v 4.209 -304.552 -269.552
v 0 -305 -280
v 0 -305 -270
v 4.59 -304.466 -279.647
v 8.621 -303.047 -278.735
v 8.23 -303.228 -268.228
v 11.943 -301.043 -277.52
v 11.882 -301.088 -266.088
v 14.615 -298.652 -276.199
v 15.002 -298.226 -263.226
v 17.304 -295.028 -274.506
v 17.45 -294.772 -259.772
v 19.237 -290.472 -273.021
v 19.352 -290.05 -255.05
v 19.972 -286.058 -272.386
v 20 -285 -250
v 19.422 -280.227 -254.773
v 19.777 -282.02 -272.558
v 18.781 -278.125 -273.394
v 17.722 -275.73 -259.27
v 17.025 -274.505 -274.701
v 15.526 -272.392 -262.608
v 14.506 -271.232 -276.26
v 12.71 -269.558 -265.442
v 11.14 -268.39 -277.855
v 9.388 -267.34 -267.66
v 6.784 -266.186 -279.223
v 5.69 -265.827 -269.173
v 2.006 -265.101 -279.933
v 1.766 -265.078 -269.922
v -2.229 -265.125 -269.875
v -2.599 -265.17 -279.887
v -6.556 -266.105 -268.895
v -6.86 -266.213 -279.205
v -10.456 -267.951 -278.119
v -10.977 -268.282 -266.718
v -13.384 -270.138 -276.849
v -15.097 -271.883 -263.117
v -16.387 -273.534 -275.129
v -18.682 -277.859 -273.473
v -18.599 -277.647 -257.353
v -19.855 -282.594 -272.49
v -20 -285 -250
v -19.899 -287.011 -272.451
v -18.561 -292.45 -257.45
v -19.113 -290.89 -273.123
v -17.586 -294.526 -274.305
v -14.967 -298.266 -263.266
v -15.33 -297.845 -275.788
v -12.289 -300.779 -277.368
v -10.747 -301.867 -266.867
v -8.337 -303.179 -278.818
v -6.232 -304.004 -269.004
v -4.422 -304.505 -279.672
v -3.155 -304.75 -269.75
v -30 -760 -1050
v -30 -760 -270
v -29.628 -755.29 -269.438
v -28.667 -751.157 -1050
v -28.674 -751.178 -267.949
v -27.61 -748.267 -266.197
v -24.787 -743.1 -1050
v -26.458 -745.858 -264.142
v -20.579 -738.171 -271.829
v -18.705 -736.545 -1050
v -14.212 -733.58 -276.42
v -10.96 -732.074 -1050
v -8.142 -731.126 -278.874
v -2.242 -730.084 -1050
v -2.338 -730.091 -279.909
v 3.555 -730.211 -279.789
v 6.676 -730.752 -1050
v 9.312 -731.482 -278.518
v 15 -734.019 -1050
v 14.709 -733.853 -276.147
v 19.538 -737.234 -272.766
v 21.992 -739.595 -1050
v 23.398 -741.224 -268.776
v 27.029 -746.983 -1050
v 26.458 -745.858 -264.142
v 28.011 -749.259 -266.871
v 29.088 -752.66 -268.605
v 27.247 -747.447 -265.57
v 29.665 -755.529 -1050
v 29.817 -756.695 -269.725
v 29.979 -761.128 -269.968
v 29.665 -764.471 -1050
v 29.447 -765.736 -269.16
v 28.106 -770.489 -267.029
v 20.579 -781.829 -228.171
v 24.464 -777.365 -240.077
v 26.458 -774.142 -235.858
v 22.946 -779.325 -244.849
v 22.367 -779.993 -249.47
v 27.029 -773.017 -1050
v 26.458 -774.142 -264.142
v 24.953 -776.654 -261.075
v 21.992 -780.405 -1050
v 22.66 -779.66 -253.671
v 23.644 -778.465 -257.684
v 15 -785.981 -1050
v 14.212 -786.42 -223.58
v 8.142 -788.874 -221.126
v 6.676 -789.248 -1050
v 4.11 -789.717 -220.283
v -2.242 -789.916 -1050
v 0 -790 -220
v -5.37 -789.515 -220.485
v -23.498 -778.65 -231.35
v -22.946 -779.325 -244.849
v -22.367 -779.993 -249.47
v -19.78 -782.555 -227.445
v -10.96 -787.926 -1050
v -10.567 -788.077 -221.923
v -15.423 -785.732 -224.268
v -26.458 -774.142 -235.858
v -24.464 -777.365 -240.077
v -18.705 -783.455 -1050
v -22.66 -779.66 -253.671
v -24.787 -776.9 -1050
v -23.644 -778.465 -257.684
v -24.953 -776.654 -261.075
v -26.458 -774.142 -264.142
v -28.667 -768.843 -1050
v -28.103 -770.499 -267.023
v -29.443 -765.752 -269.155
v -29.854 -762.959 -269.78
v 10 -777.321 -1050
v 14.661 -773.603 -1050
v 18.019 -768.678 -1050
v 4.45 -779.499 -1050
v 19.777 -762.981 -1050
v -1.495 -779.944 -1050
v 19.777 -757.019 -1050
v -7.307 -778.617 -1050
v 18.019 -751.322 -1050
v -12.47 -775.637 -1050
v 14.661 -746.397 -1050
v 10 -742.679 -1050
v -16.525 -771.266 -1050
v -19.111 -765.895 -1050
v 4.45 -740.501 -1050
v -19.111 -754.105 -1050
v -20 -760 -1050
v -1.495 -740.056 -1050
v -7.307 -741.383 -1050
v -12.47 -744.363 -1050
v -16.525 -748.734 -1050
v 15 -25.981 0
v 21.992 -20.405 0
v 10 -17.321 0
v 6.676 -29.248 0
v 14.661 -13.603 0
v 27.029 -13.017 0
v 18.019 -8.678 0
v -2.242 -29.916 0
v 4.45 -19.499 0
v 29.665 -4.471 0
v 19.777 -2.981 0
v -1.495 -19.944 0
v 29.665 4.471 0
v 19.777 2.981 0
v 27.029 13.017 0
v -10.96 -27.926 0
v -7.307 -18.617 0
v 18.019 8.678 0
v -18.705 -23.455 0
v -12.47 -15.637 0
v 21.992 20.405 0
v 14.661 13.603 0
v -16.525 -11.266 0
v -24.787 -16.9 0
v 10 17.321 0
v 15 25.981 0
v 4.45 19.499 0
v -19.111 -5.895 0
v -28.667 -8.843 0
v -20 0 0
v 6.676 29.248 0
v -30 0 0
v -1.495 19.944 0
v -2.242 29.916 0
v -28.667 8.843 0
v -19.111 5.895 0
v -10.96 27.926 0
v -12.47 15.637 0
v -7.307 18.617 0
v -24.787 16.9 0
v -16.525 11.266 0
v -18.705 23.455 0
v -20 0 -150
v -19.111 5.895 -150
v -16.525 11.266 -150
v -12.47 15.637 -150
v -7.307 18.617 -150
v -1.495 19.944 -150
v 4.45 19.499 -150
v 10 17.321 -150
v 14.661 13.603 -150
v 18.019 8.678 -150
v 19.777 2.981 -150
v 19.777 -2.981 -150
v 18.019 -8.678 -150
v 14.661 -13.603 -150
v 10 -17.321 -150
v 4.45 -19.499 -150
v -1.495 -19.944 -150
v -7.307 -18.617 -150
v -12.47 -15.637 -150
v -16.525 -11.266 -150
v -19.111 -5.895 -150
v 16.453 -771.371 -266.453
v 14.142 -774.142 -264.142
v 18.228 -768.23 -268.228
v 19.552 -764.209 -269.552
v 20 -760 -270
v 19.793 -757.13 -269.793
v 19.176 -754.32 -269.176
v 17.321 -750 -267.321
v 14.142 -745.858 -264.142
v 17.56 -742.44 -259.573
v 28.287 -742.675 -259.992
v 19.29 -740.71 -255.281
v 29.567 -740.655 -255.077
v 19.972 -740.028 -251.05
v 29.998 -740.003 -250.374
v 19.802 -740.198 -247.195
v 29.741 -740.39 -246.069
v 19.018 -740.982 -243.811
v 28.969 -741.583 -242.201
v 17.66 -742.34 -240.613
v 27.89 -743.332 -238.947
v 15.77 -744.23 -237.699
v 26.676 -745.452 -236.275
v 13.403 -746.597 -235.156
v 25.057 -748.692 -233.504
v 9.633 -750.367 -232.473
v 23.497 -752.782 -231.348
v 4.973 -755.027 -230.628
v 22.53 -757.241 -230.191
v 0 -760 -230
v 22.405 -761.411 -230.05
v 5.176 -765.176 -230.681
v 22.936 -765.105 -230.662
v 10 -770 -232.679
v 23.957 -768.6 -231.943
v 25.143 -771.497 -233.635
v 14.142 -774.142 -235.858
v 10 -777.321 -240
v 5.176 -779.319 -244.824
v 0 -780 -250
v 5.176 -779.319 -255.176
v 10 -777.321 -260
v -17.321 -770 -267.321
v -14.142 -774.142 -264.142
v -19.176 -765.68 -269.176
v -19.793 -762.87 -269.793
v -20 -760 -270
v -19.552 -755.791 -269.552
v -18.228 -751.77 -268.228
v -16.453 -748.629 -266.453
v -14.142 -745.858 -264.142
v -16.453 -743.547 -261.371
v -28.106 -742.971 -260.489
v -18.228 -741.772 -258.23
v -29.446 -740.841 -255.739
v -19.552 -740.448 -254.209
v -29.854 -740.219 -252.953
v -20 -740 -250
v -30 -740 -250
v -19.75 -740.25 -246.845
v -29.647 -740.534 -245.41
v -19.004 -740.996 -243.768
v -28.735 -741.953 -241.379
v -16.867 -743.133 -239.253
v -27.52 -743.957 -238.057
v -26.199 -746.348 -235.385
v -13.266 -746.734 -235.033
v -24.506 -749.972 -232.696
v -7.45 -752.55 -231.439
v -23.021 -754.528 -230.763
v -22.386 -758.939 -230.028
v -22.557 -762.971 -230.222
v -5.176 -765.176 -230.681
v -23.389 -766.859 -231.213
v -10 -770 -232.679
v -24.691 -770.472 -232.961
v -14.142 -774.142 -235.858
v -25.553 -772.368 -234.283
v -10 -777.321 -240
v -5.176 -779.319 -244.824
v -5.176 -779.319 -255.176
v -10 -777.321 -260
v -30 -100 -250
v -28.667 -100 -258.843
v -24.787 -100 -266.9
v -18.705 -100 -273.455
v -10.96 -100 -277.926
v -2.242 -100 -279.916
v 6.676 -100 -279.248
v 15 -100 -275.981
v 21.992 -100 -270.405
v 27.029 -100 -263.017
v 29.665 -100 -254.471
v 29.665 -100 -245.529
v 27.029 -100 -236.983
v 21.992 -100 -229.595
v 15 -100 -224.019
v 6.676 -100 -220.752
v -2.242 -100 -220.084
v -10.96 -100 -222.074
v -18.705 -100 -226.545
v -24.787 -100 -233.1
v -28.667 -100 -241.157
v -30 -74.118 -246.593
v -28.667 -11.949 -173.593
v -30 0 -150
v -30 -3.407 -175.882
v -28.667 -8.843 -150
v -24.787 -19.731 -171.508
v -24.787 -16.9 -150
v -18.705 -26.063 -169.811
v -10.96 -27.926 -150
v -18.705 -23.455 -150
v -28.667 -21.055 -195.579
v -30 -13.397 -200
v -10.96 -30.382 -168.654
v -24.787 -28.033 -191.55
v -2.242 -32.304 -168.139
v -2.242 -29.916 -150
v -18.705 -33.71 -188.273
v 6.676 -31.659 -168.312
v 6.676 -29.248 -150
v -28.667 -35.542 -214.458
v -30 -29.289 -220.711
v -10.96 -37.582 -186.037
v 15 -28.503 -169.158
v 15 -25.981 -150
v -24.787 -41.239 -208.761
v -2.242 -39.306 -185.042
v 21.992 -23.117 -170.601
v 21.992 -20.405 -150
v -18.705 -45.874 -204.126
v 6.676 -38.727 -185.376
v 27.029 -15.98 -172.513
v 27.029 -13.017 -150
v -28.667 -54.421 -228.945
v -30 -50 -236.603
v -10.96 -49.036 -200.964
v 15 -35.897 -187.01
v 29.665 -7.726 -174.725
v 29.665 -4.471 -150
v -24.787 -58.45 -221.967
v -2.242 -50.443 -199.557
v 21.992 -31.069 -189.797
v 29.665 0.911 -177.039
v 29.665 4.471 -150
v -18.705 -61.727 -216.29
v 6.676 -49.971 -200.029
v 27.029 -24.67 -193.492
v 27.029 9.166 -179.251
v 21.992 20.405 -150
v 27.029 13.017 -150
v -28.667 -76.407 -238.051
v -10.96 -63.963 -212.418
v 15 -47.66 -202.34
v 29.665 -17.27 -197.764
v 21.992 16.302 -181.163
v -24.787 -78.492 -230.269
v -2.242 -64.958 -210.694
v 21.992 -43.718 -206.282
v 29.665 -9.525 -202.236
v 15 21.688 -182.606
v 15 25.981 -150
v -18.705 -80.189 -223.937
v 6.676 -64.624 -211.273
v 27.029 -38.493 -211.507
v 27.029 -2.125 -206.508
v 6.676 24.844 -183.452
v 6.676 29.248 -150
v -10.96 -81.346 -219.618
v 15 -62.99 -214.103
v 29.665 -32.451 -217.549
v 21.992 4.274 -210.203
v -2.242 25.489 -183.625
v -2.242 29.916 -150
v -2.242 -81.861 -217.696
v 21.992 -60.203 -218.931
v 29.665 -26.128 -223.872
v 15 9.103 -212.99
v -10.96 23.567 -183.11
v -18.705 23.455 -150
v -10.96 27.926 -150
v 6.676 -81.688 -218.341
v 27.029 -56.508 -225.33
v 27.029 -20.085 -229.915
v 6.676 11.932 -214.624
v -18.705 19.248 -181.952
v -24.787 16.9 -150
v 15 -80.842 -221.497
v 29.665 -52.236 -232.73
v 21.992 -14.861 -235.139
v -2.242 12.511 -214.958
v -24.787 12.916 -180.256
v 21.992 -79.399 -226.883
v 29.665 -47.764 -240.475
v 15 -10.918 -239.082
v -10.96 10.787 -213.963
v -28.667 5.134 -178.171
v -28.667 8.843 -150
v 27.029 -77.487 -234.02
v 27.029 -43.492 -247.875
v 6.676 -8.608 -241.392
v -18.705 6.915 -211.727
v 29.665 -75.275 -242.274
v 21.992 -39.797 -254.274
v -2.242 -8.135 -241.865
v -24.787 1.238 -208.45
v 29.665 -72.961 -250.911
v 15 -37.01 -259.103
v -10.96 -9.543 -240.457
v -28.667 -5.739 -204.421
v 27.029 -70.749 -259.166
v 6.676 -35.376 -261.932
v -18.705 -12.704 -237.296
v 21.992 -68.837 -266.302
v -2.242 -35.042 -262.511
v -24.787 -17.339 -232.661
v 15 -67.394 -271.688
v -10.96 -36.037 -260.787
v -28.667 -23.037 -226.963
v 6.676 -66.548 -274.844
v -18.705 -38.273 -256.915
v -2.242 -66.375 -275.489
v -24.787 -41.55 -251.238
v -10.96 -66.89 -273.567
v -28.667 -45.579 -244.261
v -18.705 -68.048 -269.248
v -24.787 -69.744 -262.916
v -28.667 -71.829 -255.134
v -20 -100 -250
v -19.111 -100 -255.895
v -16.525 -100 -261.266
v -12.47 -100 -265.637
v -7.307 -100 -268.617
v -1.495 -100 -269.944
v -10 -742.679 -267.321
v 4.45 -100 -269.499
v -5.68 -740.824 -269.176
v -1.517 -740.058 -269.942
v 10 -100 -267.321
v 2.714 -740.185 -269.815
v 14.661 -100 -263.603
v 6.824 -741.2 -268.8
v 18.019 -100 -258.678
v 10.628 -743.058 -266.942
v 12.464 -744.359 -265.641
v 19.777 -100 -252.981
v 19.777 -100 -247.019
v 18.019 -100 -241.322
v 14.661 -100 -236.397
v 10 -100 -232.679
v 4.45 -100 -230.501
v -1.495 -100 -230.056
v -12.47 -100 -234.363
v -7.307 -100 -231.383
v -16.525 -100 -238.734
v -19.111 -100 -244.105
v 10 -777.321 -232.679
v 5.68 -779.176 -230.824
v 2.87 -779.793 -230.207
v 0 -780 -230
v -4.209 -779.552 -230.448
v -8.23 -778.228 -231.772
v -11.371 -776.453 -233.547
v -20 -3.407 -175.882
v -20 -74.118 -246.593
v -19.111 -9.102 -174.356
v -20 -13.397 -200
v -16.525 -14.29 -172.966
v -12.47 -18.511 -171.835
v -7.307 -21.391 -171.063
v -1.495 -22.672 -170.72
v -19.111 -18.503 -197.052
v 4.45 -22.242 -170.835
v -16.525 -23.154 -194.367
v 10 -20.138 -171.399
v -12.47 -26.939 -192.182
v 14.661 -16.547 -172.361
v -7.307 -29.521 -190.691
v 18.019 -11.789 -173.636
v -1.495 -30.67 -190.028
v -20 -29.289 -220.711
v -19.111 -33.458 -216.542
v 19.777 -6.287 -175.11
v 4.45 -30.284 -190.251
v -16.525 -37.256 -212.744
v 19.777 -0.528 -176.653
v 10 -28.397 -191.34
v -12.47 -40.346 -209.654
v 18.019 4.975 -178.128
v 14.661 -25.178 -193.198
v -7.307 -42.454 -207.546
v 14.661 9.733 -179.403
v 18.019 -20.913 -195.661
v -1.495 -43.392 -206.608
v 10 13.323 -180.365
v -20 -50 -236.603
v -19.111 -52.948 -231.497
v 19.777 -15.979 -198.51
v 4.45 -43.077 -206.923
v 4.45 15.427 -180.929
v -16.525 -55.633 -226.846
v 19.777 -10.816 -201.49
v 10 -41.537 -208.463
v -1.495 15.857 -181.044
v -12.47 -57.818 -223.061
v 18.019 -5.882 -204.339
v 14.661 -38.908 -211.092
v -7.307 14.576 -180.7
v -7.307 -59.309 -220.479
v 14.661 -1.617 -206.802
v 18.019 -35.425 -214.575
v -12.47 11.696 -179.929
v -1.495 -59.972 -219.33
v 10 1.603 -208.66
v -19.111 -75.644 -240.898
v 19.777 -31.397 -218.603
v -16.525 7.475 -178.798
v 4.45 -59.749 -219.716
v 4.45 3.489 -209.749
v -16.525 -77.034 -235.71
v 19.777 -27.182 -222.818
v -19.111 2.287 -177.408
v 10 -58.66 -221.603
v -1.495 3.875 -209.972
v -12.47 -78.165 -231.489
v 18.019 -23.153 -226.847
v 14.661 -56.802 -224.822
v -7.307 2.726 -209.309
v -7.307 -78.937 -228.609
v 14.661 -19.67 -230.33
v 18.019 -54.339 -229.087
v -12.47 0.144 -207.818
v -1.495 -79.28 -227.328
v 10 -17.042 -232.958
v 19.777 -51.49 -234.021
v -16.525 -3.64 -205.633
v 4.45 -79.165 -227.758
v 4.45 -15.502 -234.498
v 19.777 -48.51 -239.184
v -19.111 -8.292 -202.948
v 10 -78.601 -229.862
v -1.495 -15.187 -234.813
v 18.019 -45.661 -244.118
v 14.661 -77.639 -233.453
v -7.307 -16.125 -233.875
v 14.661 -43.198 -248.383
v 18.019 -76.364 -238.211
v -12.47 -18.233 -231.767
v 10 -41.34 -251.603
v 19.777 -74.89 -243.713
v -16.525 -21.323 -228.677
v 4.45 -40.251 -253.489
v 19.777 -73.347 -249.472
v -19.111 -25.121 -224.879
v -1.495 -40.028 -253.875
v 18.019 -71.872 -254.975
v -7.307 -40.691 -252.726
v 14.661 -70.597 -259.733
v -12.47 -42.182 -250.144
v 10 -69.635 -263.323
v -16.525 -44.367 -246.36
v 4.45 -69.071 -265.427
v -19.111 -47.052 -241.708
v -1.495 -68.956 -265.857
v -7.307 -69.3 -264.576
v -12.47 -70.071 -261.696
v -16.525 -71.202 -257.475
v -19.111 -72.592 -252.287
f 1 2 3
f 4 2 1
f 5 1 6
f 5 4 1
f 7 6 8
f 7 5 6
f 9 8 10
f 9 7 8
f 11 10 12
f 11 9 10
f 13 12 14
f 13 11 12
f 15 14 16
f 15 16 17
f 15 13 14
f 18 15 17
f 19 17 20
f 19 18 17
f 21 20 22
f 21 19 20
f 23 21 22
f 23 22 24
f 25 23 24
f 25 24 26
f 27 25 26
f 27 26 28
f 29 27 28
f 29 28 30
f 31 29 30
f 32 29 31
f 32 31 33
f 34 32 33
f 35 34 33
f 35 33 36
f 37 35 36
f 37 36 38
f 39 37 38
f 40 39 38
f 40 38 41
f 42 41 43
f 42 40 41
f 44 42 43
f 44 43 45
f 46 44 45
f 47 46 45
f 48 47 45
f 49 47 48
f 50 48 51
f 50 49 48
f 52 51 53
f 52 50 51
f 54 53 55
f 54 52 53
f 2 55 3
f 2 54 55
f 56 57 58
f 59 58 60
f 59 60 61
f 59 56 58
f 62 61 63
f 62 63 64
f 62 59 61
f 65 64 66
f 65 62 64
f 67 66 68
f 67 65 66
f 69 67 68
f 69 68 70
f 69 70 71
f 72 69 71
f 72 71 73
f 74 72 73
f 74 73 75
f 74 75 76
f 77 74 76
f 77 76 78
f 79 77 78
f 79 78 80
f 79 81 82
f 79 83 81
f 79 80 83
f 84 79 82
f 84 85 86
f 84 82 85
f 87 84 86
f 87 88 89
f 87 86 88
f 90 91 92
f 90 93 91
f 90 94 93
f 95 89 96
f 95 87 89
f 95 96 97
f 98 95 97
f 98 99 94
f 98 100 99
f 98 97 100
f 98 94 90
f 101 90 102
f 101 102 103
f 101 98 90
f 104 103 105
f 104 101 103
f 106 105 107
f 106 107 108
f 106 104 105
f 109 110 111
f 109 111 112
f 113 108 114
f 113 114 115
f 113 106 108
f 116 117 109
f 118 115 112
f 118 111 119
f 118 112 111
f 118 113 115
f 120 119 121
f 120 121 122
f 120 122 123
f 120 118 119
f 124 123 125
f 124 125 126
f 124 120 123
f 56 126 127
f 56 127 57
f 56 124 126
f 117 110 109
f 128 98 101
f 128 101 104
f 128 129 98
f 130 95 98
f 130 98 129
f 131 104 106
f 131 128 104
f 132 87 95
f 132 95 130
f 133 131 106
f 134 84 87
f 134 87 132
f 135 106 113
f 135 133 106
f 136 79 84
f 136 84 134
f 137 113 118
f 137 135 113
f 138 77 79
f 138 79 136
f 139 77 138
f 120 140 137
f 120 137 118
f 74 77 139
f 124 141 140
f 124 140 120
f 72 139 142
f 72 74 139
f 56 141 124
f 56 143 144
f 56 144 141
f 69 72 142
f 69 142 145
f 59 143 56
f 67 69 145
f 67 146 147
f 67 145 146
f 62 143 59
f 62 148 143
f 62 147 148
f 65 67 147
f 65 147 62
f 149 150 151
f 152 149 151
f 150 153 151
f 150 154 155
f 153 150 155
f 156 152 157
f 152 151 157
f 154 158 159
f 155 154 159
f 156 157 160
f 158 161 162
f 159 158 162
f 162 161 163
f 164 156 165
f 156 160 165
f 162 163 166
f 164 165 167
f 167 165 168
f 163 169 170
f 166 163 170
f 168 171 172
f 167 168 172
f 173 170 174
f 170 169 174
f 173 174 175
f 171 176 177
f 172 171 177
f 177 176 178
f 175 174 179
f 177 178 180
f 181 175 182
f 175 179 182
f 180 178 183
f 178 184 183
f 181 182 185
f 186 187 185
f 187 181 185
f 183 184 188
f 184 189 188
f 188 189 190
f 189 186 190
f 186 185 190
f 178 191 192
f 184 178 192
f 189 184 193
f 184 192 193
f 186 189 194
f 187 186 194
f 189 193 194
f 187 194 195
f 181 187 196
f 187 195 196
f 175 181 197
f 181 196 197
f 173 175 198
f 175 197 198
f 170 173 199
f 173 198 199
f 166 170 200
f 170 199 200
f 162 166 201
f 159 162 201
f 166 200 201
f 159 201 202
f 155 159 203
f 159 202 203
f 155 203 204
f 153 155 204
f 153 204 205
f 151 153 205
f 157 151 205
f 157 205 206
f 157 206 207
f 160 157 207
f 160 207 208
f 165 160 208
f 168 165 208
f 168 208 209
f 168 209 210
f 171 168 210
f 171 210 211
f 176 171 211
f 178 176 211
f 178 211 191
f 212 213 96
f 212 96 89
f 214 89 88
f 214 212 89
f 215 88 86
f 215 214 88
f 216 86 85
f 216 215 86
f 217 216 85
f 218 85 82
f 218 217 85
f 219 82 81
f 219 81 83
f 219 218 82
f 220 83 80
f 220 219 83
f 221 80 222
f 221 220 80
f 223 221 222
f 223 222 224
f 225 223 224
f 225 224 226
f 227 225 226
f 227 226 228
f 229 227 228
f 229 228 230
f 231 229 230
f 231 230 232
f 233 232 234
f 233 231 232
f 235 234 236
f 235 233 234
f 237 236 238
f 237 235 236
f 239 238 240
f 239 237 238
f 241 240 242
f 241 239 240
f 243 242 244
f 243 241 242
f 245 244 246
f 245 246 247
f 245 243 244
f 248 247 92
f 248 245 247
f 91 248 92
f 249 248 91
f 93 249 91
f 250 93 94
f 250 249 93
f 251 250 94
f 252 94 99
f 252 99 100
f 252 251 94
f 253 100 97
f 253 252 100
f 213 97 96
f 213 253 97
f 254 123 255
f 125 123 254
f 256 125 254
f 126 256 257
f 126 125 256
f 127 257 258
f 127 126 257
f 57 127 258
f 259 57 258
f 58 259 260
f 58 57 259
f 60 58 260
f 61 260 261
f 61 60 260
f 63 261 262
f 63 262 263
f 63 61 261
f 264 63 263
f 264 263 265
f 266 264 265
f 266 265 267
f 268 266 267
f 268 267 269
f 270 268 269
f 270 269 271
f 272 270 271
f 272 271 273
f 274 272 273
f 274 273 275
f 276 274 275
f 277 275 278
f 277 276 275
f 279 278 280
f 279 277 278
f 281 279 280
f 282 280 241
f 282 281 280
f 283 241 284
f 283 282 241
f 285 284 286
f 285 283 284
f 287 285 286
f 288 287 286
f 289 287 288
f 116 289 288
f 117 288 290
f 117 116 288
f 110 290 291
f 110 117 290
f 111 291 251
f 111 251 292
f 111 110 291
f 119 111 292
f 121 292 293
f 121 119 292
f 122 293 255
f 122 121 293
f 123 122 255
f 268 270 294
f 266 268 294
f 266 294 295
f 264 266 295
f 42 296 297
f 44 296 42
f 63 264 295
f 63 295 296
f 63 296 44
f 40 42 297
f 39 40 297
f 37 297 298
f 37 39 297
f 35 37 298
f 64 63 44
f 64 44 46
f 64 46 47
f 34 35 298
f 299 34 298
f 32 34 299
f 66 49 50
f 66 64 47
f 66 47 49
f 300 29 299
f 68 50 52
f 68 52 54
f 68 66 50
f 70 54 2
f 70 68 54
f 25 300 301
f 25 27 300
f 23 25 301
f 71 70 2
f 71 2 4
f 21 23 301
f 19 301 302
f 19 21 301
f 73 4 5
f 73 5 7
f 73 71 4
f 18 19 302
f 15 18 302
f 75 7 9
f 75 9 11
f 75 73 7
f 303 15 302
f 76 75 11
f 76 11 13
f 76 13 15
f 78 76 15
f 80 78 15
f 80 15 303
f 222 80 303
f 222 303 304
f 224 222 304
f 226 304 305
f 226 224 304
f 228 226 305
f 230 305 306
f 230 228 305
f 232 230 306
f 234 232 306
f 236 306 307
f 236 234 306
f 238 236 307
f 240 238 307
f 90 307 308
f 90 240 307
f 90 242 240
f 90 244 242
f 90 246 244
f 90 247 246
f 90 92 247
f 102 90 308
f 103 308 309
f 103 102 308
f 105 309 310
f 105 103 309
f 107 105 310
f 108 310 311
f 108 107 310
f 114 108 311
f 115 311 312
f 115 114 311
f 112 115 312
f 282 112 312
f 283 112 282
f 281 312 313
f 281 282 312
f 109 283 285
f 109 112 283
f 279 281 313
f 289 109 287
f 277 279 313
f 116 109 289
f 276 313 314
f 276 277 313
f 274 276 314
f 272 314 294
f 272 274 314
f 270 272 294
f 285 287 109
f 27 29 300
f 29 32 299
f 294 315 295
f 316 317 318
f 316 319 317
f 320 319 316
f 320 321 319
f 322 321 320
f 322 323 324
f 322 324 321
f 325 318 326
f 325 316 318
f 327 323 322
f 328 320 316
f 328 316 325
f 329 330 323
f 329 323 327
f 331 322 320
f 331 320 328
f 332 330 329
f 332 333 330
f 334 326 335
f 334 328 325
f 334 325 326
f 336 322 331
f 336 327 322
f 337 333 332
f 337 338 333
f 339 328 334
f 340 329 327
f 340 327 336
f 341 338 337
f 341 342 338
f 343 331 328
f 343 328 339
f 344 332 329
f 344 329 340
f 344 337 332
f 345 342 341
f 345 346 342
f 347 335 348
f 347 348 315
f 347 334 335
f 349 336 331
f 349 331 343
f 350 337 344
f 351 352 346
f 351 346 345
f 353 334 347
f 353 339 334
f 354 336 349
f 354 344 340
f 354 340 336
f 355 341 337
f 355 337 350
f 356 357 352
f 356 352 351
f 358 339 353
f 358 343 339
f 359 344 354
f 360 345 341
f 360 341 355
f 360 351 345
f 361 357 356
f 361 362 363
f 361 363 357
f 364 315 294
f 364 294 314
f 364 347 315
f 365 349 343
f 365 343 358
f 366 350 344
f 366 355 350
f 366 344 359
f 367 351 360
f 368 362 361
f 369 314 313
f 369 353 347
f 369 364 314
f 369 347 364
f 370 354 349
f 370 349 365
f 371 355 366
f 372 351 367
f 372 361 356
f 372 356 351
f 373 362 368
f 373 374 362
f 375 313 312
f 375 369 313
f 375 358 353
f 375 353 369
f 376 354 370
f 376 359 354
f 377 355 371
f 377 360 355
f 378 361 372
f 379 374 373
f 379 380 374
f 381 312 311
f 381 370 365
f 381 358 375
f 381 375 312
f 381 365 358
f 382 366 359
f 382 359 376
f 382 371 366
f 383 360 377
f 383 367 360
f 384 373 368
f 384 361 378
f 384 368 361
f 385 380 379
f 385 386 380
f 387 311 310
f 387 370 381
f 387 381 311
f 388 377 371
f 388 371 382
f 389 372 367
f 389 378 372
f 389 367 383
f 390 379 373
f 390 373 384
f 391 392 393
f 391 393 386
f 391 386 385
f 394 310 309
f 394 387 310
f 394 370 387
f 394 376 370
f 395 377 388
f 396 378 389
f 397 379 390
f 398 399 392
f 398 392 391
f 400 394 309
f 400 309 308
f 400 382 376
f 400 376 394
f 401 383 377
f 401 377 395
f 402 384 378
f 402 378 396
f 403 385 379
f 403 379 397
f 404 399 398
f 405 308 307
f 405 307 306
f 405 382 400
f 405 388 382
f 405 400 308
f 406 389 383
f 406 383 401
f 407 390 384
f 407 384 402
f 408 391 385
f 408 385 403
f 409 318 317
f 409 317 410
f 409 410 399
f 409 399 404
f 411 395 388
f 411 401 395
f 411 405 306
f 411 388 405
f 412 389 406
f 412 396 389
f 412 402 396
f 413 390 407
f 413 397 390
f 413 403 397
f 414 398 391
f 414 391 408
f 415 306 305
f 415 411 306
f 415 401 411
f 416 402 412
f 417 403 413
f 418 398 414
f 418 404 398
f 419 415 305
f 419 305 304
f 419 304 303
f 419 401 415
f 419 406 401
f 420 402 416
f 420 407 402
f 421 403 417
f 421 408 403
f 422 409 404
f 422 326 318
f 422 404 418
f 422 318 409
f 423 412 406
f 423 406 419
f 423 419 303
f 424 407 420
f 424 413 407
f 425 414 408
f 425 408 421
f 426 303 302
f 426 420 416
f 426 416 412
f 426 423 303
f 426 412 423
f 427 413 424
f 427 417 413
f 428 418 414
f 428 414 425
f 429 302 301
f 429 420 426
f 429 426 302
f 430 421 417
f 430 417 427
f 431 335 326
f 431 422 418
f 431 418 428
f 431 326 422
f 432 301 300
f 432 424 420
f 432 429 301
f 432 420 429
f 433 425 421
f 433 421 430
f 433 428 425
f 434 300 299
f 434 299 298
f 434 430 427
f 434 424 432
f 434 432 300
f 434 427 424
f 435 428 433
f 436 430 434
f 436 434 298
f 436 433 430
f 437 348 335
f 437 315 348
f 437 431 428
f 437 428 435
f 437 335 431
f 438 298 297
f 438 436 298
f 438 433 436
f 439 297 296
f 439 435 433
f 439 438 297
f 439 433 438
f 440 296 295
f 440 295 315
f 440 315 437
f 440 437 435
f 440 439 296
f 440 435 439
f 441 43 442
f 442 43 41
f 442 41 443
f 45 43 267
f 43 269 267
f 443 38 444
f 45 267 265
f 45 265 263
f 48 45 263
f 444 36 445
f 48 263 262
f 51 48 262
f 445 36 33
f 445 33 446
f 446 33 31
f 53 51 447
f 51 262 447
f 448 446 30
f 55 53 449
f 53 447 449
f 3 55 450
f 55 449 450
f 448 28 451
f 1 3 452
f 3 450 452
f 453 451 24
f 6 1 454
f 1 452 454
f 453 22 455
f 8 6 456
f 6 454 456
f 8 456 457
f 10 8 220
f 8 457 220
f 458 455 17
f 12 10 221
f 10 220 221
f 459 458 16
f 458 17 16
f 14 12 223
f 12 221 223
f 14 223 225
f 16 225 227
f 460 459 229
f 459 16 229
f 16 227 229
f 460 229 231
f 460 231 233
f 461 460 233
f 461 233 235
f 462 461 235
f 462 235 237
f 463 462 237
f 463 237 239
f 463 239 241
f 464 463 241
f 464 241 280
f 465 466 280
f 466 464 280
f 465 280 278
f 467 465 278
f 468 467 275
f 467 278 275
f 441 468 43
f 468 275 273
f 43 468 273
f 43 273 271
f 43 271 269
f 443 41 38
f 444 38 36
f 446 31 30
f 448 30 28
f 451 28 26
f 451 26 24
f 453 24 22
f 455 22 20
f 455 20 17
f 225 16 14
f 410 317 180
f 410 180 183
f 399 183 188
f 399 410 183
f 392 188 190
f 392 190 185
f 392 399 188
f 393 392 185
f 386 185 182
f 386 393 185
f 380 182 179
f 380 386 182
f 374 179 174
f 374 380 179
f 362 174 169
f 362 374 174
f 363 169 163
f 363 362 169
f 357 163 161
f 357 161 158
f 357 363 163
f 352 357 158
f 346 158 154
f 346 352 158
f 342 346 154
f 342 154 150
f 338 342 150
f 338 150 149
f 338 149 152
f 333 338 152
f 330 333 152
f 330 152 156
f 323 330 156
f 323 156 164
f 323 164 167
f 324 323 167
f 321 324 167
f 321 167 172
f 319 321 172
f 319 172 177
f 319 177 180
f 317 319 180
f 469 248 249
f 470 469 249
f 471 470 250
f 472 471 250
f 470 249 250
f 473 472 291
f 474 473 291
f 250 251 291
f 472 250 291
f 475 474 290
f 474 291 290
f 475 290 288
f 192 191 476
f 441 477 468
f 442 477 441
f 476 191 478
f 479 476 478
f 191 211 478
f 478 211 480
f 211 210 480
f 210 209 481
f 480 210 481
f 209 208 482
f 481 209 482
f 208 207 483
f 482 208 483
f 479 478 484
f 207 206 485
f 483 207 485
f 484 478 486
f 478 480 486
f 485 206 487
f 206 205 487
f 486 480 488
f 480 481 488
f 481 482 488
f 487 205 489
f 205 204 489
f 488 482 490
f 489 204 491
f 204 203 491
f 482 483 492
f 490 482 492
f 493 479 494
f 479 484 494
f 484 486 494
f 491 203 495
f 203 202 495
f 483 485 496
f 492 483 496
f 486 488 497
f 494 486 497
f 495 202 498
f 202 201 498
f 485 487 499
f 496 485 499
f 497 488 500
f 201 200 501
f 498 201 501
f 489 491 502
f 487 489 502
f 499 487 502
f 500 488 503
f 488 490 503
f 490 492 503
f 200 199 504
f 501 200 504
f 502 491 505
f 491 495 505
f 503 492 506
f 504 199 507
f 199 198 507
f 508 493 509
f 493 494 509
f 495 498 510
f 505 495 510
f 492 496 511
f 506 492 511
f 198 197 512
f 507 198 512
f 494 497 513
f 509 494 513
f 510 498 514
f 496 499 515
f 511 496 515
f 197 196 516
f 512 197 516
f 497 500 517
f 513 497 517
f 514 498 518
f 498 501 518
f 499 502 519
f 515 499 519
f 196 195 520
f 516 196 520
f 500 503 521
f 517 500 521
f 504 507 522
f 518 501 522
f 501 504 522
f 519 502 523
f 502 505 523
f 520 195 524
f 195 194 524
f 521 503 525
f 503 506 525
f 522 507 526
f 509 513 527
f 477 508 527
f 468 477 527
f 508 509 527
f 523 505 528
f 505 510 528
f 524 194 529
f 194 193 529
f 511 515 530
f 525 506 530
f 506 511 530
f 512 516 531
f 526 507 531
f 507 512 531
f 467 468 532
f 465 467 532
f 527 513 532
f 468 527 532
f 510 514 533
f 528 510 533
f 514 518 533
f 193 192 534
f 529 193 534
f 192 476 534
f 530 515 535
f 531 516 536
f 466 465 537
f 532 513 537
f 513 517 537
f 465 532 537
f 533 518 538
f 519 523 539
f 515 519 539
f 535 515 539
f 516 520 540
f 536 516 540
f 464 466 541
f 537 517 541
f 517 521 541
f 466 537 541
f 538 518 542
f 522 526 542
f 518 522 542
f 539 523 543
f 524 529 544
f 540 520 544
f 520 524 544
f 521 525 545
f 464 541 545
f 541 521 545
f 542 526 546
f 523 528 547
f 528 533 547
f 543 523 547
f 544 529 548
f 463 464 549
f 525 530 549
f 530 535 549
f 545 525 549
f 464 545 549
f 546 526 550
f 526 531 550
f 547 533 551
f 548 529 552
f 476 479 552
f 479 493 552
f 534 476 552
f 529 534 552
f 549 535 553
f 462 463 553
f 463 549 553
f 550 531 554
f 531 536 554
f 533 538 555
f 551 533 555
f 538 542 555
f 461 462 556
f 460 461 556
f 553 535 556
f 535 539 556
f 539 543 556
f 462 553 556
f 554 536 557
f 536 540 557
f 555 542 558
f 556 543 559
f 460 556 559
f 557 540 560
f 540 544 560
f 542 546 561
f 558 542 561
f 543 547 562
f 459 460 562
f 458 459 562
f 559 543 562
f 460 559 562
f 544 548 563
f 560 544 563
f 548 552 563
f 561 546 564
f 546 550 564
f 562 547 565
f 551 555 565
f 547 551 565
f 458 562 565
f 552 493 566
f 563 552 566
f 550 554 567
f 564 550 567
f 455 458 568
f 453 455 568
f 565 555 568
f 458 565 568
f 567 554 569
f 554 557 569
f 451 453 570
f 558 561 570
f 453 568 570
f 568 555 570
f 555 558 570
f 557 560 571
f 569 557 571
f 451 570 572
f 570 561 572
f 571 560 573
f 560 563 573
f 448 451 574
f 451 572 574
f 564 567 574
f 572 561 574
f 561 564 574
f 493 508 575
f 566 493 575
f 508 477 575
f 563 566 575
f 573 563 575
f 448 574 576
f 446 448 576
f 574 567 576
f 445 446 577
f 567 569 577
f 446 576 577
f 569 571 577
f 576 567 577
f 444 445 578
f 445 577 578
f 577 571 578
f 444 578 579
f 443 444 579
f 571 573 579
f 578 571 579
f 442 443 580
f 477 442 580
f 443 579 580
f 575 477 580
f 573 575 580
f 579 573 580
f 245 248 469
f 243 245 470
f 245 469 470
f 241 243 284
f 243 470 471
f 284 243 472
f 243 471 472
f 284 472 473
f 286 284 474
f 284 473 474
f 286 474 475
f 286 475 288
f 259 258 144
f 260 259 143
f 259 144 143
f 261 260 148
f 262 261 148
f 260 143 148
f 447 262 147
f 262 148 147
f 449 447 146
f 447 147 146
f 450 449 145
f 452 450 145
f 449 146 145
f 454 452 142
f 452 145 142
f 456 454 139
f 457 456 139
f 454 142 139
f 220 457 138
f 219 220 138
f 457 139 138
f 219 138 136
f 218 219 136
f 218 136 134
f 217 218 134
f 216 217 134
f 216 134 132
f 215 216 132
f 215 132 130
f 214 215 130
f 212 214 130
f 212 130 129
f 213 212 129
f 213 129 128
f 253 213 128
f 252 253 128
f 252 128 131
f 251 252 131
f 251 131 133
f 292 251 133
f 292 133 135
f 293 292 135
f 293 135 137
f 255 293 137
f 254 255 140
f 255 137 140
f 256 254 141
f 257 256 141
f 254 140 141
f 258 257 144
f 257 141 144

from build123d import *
from OCP.BRepAlgoAPI import BRepAlgoAPI_Cut
from OCP.TopTools import TopTools_ListOfShape

# Parameters (mm, degrees)
SWEEP_THIN1_PROFILE_R   = 30
SWEEP_THIN1_PROFILE_R_2 = 20
CUT_EXTRUDE1_DEPTH      = 1315.343942812
CUT_EXTRUDE1_DEPTH_BACK = 1315.343942812
SKETCH18_R              = 20
SKETCH19_R              = 20
CUT_EXTRUDE2_DEPTH      = 100


with BuildPart() as part:
    # Sweep-Thin1: sweep along a path in Sketch1
    with BuildLine(Plane(origin=(0, 0, 0), x_dir=(0, 0, -1), z_dir=(1, 0, 0))) as sweep_thin1_path:
        Line((0, 0), (150, 0))
        ThreePointArc((150, 0), (220.710678119, -29.289321881), (250, -100))
        Line((250, -100), (250, -760))
        Line((250, -760), (1050, -760))
    # Sweep-Thin1 profile (on start of the path) → Sweep-Thin1 (sweep)
    with BuildSketch(Plane(origin=(0, 0, 0), x_dir=(-1, 0, 0), z_dir=(0, 0, -1))):
        Circle(SWEEP_THIN1_PROFILE_R)
        Circle(SWEEP_THIN1_PROFILE_R_2, mode=Mode.SUBTRACT)
    sweep(path=sweep_thin1_path.line, transition=Transition.RIGHT)

    # Sketch18 → Cut-Extrude1 (cut, two sides: drawn at the far end of the back side and taken through both)
    with BuildSketch(Plane(origin=(0, 0, 0), x_dir=(0, 0, -1), z_dir=(1, 0, 0)).offset(-CUT_EXTRUDE1_DEPTH_BACK)):
        with Locations((250, -760)):
            Circle(SKETCH18_R)
    extrude(amount=CUT_EXTRUDE1_DEPTH + CUT_EXTRUDE1_DEPTH_BACK, mode=Mode.SUBTRACT)


with BuildPart() as cut_extrude2_tool:
    # Sketch19 → Cut-Extrude2 (new body)
    with BuildSketch(Plane.XY.offset(-350)):
        with Locations((0, -285)):
            Circle(SKETCH19_R)
    extrude(amount=CUT_EXTRUDE2_DEPTH)


with BuildPart() as part_1:
    add(part.part)

    # Cut-Extrude2: cut by cut_extrude2_tool, with a tolerance
    cut_extrude2_stock = TopTools_ListOfShape()
    cut_extrude2_stock.Append(part_1.part.wrapped)
    cut_extrude2_tools = TopTools_ListOfShape()
    cut_extrude2_tools.Append(cut_extrude2_tool.part.wrapped)
    cut_extrude2_cut = BRepAlgoAPI_Cut()
    cut_extrude2_cut.SetArguments(cut_extrude2_stock)
    cut_extrude2_cut.SetTools(cut_extrude2_tools)
    cut_extrude2_cut.SetFuzzyValue(0.00001)
    cut_extrude2_cut.Build()
    add(Compound.cast(cut_extrude2_cut.Shape()).solids(), mode=Mode.REPLACE)


solid = part_1.part
